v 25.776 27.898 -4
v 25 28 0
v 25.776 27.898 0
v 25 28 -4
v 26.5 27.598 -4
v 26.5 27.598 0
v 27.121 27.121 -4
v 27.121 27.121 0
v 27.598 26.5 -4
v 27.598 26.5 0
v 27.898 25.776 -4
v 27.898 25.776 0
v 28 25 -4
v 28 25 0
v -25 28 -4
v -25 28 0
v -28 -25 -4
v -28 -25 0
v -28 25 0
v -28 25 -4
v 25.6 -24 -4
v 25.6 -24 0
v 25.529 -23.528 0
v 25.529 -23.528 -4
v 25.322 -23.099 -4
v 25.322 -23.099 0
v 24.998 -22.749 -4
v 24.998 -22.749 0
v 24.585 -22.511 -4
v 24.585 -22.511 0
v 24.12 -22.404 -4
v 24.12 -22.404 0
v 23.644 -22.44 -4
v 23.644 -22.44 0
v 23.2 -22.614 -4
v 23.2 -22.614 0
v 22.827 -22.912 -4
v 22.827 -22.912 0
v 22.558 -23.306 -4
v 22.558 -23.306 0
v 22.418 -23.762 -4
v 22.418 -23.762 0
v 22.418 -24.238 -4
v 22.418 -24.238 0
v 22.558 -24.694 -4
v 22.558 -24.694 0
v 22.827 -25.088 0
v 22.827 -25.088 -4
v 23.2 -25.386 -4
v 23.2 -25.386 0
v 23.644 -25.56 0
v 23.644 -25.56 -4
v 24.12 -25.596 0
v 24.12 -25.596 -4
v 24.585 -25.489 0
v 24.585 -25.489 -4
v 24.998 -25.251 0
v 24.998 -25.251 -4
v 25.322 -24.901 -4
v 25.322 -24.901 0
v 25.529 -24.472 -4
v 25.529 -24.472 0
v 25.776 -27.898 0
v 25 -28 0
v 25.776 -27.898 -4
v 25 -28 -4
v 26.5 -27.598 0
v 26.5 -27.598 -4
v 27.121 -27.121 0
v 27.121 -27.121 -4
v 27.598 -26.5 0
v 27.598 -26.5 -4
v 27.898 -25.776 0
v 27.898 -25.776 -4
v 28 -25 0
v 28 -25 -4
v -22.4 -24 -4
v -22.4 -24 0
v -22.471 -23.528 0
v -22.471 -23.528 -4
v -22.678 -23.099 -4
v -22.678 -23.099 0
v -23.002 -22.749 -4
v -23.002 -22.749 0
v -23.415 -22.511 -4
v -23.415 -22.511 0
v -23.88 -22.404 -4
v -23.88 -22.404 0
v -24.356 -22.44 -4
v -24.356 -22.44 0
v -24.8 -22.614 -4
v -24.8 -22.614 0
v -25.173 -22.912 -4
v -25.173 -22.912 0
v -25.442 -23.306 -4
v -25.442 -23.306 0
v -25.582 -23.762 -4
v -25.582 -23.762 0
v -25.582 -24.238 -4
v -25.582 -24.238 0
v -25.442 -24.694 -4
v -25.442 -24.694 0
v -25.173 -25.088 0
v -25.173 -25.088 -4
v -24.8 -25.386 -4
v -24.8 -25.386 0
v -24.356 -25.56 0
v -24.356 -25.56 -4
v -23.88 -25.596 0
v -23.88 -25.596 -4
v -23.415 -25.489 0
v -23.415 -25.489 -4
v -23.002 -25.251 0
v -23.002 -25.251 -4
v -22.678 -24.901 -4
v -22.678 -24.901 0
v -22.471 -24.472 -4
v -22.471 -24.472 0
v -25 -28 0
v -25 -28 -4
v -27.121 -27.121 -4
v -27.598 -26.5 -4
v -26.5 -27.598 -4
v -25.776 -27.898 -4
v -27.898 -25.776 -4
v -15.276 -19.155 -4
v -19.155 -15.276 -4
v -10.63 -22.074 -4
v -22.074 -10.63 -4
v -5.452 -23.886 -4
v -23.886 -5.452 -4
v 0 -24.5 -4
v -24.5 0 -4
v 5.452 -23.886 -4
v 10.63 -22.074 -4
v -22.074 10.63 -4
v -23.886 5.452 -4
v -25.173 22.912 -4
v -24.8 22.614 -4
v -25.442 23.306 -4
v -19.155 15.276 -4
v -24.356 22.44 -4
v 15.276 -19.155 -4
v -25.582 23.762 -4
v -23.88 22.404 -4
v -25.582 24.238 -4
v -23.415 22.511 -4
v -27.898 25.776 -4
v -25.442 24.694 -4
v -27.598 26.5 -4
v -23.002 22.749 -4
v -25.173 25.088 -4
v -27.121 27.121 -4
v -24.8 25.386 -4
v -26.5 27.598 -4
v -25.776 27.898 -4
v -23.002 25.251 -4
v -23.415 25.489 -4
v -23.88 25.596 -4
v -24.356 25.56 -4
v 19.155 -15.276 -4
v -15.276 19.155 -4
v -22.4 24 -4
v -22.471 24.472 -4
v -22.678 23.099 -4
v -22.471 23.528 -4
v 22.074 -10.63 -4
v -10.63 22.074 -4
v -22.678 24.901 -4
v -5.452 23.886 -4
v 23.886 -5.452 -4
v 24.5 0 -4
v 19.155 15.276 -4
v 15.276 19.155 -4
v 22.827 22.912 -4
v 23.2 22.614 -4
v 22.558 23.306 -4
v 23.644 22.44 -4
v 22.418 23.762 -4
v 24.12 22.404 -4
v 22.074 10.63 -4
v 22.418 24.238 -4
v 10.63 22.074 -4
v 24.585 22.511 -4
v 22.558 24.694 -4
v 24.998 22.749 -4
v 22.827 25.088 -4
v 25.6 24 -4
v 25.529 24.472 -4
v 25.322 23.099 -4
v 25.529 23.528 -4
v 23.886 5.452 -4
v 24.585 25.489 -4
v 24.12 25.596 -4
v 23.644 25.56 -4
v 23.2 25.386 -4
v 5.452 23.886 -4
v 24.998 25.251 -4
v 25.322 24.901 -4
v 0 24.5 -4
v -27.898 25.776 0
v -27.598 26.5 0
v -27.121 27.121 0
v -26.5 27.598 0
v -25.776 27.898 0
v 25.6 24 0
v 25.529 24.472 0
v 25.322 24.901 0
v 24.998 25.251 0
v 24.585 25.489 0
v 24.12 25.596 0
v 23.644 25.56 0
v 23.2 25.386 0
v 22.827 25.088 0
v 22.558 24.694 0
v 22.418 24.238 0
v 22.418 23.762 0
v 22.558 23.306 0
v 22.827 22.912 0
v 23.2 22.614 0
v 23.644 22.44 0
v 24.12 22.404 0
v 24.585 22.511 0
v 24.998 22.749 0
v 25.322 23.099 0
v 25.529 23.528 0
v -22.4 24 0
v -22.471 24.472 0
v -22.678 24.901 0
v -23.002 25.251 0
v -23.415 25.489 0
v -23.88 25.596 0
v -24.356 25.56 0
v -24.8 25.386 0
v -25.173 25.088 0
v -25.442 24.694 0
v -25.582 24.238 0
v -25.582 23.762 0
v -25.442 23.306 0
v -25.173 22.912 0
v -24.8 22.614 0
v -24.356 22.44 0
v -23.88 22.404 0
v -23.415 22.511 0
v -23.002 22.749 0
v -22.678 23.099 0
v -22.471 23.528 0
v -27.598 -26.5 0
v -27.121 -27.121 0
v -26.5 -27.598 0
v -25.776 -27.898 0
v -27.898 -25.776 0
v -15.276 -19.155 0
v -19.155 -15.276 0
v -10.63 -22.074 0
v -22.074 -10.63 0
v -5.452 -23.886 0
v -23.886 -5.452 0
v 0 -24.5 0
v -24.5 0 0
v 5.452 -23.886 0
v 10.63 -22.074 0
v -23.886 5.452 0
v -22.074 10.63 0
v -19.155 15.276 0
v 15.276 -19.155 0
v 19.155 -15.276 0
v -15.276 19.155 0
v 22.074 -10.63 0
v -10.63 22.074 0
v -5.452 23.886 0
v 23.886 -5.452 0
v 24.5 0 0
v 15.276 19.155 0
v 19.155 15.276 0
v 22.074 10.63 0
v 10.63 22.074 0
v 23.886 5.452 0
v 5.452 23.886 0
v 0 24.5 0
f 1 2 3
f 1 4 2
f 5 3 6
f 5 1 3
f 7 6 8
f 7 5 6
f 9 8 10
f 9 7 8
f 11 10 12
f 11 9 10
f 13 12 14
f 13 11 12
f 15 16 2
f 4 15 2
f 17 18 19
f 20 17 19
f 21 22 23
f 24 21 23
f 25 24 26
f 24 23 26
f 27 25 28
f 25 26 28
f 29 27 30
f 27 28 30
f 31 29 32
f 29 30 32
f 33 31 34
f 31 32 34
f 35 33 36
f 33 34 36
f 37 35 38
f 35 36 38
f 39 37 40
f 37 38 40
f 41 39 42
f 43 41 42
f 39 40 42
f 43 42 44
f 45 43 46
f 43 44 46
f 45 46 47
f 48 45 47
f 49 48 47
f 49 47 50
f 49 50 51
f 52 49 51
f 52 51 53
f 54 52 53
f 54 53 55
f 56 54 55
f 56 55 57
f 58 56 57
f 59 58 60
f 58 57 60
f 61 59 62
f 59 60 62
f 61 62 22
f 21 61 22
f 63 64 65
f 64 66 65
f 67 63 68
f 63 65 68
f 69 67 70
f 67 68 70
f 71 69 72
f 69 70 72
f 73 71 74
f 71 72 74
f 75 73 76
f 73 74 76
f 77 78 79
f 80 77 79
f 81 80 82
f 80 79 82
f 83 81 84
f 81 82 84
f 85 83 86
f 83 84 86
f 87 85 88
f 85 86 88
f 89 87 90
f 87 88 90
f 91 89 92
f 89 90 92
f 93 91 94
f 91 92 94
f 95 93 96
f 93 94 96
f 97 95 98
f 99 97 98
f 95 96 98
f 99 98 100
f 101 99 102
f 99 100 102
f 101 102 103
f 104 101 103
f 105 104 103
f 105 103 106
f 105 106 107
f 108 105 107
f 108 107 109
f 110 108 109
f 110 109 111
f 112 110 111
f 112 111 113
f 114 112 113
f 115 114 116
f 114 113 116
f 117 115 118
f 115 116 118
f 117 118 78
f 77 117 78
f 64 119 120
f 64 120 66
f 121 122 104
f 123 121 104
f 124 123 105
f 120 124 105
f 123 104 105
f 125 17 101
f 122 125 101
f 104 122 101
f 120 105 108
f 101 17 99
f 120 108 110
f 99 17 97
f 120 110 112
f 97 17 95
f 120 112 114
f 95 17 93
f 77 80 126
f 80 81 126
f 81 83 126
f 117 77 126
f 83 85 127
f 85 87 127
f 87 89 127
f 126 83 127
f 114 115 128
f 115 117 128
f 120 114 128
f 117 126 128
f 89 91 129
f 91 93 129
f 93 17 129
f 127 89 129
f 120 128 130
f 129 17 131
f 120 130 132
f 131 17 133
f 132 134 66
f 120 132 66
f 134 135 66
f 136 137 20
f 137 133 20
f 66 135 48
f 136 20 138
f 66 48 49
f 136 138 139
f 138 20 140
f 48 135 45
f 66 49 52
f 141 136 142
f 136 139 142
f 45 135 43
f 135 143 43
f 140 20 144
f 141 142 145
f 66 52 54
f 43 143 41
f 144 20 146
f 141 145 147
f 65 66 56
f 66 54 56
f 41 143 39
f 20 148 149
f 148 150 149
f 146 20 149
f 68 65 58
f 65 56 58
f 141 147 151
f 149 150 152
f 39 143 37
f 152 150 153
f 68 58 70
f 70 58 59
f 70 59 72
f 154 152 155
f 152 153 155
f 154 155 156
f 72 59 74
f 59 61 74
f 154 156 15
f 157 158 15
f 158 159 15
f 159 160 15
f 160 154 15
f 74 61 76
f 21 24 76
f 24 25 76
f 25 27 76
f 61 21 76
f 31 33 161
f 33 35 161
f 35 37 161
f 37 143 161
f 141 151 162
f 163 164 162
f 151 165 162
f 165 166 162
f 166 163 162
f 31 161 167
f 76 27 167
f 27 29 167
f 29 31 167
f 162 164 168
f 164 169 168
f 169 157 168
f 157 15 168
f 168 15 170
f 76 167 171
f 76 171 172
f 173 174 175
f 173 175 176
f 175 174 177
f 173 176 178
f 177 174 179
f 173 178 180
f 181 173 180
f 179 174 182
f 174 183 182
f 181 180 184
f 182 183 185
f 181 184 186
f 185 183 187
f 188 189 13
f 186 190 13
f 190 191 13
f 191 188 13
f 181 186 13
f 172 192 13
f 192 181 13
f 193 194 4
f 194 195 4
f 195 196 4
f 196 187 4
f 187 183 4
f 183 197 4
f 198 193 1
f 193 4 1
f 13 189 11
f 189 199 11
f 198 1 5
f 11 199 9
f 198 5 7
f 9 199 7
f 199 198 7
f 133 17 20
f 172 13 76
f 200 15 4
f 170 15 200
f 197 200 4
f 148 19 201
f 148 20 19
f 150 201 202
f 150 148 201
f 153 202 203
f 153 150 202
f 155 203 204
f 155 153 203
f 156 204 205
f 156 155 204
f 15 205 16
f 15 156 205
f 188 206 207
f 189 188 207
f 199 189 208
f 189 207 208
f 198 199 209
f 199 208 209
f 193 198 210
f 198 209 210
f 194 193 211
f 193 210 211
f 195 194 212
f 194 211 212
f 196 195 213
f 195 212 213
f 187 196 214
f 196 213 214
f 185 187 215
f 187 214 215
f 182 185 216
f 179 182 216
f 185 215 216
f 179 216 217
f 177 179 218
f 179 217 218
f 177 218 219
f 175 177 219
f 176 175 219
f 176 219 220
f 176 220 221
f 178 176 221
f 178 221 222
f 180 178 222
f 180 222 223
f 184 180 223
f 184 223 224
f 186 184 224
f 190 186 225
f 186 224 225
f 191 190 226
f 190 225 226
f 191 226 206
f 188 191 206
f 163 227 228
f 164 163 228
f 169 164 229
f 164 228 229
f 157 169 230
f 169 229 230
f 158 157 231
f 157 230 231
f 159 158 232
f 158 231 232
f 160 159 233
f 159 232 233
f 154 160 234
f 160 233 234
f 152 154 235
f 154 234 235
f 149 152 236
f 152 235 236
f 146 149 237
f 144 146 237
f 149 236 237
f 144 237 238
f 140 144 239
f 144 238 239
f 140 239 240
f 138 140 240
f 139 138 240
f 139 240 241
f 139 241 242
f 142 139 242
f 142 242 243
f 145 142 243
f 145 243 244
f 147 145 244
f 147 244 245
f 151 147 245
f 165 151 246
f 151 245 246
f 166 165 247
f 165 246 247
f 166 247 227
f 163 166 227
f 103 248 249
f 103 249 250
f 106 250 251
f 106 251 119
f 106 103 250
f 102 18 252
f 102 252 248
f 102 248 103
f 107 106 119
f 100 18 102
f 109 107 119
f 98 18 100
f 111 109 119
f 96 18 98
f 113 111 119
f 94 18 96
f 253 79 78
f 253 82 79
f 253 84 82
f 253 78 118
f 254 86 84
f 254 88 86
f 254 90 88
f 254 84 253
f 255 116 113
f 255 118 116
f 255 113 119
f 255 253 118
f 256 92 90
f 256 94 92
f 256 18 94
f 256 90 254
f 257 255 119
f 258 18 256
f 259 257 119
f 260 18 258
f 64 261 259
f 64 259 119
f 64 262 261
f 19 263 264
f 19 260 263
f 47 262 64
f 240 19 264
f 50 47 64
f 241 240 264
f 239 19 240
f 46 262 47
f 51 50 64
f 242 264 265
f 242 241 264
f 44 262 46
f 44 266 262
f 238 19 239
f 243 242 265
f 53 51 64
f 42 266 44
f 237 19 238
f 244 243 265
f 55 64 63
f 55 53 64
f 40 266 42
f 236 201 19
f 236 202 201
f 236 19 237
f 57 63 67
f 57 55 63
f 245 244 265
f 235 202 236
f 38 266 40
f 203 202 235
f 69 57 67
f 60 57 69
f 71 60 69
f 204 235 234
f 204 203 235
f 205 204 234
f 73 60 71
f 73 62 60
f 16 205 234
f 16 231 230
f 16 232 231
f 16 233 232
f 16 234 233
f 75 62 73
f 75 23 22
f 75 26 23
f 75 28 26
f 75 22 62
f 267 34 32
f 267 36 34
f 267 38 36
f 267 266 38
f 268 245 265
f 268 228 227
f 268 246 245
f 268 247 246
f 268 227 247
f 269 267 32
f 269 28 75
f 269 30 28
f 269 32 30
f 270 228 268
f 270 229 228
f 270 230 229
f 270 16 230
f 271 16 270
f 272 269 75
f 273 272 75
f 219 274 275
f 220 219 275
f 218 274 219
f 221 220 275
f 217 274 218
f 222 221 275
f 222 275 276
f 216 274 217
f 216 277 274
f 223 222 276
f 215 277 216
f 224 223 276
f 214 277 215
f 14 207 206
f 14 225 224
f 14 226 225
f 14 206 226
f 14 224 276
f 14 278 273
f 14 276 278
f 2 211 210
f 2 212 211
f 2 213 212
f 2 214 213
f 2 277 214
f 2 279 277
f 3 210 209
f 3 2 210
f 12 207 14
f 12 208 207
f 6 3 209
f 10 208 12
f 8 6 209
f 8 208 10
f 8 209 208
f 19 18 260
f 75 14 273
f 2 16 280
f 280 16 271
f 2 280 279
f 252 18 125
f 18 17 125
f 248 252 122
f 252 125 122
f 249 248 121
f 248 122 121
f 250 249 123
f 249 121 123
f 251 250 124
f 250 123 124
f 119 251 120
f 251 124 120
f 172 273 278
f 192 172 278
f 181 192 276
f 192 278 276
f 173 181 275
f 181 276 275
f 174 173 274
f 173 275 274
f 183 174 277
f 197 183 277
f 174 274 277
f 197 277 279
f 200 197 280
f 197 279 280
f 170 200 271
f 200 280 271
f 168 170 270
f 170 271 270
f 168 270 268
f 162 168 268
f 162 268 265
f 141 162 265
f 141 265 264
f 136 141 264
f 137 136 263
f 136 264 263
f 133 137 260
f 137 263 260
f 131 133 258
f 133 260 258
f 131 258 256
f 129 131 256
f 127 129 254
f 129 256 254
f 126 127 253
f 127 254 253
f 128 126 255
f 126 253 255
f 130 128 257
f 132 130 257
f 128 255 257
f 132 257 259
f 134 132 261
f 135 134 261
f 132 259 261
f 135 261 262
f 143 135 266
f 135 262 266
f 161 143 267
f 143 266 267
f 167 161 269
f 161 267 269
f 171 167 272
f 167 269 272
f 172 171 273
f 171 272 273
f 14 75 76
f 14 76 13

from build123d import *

# Parameters (mm, degrees)
SKETCH_1_W             = 56
SKETCH_1_H             = 56
SM_BASE_FLANGE_1_DEPTH = 4
SKETCH_6_R             = 24.5
SKETCH_6_R_2           = 1.6
CUT_EXTRUDE_1_DEPTH    = 4
FILLET_1_R             = 3


# Sheet-metal steps are written as plain solids
with BuildPart() as part:
    # Sketch 1 → Базовая кромка1 (new body)
    with BuildSketch(Plane.XY):
        Rectangle(SKETCH_1_W, SKETCH_1_H)
    extrude(amount=-SM_BASE_FLANGE_1_DEPTH)

    # Эскиз6 → Вырез-Вытянуть1 (cut)
    with BuildSketch(Plane.XY):
        Circle(SKETCH_6_R)
        with Locations((-24, 24)):
            Circle(SKETCH_6_R_2)
        with Locations((24, 24)):
            Circle(SKETCH_6_R_2)
        with Locations((24, -24)):
            Circle(SKETCH_6_R_2)
        with Locations((-24, -24)):
            Circle(SKETCH_6_R_2)
    extrude(amount=-CUT_EXTRUDE_1_DEPTH, mode=Mode.SUBTRACT)

    # Скругление1
    fillet_1_edges = [part.edges().sort_by_distance(p)[0] for p in [
        (28, -28, -2),
        (-28, -28, -2),
        (-28, 28, -2),
        (28, 28, -2),
    ]]
    fillet(fillet_1_edges, radius=FILLET_1_R)


solid = part.part
